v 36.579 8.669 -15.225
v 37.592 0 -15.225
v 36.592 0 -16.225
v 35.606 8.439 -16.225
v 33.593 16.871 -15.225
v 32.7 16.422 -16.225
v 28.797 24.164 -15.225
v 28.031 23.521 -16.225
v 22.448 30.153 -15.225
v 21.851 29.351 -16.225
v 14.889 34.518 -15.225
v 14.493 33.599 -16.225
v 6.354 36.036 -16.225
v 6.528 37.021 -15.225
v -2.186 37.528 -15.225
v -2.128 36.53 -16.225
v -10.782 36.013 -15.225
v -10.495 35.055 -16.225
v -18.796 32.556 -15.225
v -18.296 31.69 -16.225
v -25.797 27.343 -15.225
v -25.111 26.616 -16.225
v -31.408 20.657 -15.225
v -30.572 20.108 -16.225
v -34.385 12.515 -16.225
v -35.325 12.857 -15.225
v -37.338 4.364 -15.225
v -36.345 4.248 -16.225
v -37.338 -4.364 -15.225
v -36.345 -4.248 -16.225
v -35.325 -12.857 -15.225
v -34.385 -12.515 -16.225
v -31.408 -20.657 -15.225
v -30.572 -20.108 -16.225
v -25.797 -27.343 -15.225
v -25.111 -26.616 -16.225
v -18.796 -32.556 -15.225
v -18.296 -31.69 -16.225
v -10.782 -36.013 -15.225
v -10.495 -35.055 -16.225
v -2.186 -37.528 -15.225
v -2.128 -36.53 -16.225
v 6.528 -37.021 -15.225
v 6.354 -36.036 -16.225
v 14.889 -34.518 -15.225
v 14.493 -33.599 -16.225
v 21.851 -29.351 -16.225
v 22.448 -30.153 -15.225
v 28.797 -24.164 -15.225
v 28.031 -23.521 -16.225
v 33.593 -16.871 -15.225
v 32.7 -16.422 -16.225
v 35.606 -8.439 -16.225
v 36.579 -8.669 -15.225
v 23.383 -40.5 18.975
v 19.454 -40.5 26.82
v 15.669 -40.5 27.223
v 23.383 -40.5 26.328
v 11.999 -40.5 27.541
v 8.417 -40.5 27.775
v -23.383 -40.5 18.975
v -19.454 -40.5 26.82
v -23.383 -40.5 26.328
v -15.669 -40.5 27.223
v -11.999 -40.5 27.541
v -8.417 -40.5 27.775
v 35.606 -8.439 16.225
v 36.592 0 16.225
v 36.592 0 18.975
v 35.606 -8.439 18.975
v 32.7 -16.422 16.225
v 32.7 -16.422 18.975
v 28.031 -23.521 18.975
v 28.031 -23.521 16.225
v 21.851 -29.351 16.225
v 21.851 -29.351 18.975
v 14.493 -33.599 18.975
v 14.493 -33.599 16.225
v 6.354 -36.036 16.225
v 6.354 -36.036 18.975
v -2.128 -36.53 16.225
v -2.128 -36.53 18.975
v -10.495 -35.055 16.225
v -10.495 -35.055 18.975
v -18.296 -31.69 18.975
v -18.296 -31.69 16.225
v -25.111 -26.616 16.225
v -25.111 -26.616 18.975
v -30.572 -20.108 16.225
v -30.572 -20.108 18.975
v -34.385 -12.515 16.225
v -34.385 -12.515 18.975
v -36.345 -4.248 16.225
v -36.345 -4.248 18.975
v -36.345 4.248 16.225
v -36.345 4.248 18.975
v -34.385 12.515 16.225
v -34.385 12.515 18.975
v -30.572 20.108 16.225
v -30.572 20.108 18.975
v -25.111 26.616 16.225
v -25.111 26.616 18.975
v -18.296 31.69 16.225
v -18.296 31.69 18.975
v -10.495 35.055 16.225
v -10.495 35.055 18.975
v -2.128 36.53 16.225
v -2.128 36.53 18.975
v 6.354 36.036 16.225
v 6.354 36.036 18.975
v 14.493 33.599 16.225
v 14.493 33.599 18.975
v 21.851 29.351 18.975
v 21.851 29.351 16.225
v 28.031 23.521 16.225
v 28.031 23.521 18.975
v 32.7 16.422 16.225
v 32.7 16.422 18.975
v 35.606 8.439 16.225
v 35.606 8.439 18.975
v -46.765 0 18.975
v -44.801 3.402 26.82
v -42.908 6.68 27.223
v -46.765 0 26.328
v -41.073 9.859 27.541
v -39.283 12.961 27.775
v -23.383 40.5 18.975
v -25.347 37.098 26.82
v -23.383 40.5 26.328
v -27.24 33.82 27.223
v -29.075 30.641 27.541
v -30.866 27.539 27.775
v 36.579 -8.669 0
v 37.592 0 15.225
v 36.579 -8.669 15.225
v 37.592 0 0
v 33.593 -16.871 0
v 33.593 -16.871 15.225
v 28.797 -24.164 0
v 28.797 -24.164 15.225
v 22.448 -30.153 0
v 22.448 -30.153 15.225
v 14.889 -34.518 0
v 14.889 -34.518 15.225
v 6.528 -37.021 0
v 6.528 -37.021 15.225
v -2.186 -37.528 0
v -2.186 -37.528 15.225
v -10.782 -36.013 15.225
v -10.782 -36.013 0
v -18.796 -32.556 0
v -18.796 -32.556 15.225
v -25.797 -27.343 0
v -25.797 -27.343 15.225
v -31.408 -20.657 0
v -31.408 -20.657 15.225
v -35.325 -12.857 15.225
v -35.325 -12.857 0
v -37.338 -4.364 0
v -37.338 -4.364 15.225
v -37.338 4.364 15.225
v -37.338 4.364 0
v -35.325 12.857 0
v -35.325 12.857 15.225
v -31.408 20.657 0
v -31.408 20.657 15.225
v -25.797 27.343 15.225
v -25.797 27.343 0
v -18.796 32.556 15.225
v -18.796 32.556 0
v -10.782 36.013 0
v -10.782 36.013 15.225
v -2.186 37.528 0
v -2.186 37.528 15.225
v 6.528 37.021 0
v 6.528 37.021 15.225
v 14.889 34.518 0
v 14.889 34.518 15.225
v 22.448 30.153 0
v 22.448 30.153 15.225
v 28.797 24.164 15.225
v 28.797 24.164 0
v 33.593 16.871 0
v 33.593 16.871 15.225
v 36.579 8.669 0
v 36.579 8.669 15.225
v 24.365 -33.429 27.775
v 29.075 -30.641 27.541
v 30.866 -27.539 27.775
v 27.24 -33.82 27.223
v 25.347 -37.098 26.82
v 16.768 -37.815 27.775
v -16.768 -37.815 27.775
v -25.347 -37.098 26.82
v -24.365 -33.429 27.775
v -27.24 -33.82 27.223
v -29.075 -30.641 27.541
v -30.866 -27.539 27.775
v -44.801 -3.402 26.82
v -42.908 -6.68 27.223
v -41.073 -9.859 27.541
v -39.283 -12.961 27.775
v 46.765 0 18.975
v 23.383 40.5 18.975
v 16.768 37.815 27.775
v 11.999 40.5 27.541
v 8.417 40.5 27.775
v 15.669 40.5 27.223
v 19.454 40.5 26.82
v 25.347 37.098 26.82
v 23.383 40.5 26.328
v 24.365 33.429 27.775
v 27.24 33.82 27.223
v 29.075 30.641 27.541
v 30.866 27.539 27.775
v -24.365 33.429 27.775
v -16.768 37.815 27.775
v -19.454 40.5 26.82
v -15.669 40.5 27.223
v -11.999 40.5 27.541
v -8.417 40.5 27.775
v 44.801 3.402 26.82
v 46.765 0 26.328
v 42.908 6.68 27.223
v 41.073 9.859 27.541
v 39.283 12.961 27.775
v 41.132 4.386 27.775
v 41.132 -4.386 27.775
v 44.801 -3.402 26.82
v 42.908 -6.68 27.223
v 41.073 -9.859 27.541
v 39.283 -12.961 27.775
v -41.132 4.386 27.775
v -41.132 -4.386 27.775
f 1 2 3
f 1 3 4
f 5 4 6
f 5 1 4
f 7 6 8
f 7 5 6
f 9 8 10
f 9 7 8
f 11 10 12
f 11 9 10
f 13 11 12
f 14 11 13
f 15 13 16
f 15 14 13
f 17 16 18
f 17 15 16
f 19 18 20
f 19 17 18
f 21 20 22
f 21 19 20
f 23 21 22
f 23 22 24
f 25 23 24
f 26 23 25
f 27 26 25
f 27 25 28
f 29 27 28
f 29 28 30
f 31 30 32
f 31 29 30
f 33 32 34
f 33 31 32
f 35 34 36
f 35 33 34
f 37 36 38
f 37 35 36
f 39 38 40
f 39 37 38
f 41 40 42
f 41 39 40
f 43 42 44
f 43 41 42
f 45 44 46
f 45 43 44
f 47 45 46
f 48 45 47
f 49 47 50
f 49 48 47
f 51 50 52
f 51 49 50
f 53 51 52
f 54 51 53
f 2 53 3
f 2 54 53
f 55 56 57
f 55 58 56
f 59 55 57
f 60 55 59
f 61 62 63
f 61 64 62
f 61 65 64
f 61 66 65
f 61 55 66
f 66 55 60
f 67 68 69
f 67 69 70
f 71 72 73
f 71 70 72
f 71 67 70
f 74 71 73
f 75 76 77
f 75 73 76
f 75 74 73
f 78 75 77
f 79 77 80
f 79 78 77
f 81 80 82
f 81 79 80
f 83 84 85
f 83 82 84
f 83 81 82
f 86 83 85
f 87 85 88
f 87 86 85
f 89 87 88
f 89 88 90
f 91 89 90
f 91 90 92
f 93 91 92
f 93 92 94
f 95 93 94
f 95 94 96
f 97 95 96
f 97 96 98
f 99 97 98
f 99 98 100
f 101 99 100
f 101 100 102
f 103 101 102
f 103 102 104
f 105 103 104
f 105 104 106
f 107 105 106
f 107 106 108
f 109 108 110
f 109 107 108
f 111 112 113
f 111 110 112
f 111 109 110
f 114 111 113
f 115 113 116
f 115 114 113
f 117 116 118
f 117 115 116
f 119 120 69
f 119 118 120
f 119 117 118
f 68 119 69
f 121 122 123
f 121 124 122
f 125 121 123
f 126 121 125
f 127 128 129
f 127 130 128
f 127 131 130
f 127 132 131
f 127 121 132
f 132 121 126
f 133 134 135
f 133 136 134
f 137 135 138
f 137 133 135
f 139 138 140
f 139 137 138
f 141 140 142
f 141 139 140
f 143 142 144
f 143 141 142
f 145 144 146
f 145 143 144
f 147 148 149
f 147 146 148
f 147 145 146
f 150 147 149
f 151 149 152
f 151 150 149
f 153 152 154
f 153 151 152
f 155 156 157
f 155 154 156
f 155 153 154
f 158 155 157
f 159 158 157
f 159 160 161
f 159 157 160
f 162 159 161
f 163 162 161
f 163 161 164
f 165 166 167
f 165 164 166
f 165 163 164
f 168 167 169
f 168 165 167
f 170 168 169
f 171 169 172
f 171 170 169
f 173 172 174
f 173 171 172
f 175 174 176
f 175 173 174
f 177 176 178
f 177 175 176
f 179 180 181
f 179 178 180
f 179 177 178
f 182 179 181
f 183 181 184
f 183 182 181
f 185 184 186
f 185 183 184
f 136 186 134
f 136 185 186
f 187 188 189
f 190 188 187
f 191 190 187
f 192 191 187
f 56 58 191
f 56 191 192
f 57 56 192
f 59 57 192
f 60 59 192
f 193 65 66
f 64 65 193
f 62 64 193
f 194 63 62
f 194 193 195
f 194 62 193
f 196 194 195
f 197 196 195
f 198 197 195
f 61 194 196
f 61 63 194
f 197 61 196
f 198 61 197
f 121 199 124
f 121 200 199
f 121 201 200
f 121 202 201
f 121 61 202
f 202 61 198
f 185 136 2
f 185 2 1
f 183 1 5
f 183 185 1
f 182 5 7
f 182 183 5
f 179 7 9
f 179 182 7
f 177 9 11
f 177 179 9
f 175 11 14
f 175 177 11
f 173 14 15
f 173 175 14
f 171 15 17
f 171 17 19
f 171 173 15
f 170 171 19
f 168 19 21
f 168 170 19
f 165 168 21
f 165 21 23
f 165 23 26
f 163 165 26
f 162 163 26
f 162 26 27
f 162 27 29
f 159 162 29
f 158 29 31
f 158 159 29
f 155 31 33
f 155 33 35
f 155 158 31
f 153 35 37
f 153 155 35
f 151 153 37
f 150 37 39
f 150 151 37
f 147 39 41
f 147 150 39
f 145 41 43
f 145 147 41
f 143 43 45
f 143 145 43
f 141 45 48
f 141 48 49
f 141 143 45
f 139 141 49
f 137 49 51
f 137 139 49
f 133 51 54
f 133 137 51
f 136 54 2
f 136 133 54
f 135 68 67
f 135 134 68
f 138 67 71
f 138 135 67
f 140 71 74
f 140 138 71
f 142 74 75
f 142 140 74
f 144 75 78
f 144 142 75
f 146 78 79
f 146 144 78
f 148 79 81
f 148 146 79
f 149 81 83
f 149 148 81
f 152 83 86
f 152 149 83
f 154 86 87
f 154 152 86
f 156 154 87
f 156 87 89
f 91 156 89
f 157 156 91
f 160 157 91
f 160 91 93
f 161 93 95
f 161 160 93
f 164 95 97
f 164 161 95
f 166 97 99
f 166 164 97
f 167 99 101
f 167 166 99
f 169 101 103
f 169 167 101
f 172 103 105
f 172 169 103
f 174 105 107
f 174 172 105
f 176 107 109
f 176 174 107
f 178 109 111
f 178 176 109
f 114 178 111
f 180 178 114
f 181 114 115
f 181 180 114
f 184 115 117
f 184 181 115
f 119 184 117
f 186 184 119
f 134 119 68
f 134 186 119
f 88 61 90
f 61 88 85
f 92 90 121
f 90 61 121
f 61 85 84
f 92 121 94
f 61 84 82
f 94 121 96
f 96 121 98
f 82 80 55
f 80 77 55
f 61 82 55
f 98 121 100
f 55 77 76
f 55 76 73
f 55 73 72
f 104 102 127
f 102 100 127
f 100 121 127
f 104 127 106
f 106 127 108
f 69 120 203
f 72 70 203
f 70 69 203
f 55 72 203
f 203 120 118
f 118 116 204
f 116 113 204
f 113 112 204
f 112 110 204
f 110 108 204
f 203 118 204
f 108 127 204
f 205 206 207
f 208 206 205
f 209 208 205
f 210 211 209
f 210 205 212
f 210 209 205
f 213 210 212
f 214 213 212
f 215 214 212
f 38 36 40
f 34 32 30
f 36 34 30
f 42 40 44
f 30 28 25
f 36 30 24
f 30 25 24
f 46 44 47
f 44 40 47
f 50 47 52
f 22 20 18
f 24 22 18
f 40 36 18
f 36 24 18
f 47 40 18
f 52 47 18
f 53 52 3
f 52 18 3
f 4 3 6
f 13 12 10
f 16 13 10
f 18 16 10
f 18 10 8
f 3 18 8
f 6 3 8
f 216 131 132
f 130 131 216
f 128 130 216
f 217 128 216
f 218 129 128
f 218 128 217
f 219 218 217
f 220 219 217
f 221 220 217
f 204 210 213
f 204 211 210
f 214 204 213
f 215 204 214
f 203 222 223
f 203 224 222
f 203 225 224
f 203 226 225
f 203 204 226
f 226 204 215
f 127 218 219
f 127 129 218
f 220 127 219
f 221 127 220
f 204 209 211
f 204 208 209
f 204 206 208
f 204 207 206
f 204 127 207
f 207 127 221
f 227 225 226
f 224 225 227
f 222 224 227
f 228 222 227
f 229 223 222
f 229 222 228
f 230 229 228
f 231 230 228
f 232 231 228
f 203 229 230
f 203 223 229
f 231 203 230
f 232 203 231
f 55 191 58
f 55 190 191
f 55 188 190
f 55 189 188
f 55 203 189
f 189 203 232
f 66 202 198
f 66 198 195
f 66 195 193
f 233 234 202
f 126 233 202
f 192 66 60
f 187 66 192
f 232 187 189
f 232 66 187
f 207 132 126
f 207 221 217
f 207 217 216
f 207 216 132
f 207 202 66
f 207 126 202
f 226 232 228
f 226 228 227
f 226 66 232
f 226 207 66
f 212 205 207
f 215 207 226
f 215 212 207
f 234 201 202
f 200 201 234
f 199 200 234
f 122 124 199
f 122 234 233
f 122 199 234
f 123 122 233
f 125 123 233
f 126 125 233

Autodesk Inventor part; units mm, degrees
ref_plane "YZ Plane" through (0, 0, 0) normal (1, 0, 0) x (0, 1, 0)
ref_plane "XZ Plane" through (0, 0, 0) normal (0, 1, 0) x (-1, 0, 0)
ref_plane "XY Plane" through (0, 0, 0) normal (0, 0, 1) x (1, 0, 0)
sketch "Szkic7" plane through (0, 0, 0) normal (0, 0, 1) x (1, 0, 0)
  circle A0 centre (0, 0) radius 37.592
  dimension "d35" = 75.184
extrude "Wyciągnięcie proste2" add sketch "Szkic7" along normal mid plane 32.45
chamfer "Faza2" distance 1 angle 45 1 edges at (-37.592, 0, 16.225)
sketch "Szkic9" plane through (0, 0, 16.225) normal (0, 0, 1) x (1, 0, 0)
  circle A0 centre (0, 0) radius 36.592 projected
extrude "Wyciągnięcie proste3" add sketch "Szkic9" along normal blind 2.75
sketch "Szkic10" plane through (0, 0, 18.975) normal (0, 0, 1) x (1, 0, 0)
  line L0 (-23.3827, 40.5) -> (23.3827, 40.5)
  line L1 (23.3827, 40.5) -> (46.7654, 0)
  line L2 (46.7654, 0) -> (23.3827, -40.5)
  line L3 (23.3827, -40.5) -> (-23.3827, -40.5)
  line L4 (-23.3827, -40.5) -> (-46.7654, 0)
  line L5 (-46.7654, 0) -> (-23.3827, 40.5)
  line L6 (0, 52.6288) -> (0, -52.6288) construction
  line L7 (-52.6288, 0) -> (52.6288, 0) construction
  point P0 (0, 0)
  point P1 (0, 0)
  point P2 (0, 40.5)
  dimension "d44" = 81
extrude "Wyciągnięcie proste4" add sketch "Szkic10" along normal blind 8.8
sketch "Szkic12" plane through (0, 0, 0) normal (0, 1, 0) x (-1, 0, 0)
  line L0 (0, -2.1463) -> (0, 12.8775) construction
  line L1 (-23.3827, 18.975) -> (-23.3827, 27.775) construction
  line L2 (-46.7654, 27.775) -> (-23.3827, 27.775) construction
  line L3 (-46.7654, 18.975) -> (-46.7654, 27.775) projected
  line L4 (-46.7654, 26.3281) -> (-41.3654, 27.775)
  line L5 (-46.7654, 27.775) -> (-23.3827, 27.775) projected
  line L6 (-46.7654, 18.975) -> (-23.3827, 18.975) projected
  point P0 (0, 0)
  dimension "d50" = 15
  dimension "d51" = 5.4
revolve "Obrót2" cut sketch "Szkic12" angle 360 about axis through (0, 0, -10) along (0, 0, 1)
thread "Gwint3" size "G75.184x2.309" designation "G 2 1/2" class "A" standard "ISO Pipe Threads" full length
chamfer "Faza3" distance 1 angle 45 1 edges at (-37.592, 0, -16.225)
equation "\"d35\" = OD"
equation "\"d36\" = 0.7375 * L"
equation "\"d42\" = 0.0625 * L"
equation "\"d44\" = SW"
equation "\"d45\" = 0.2 * L"
equation "\"d51\" = 0.0666667 * SW"
equation "\"SzerokośćGięciaPodcięcia\" = Grubość"
equation "\"RozmiarPodcięciaNarożnika\" = 4 * Grubość"
equation "\"PromieńPrzejścia\" = PromieńGięcia"
equation "\"Rozmiar_promienia_Jacobiego\" = PromieńGięcia"
equation "\"Wielk_odstępu\" = Grubość"
equation "\"d2\" = PromieńGięcia"
equation "\"d23\" = PromieńGięcia"
equation "\"OD\" = 75.184"
equation "\"SW\" = 81"
equation "\"L\" = 44"
equation "\"Grubość\" = 1.5"
equation "\"PromieńGięcia\" = 3"
properties part number "Korek sześciokątny BSP 2 1/2'' L=44" material "304"
